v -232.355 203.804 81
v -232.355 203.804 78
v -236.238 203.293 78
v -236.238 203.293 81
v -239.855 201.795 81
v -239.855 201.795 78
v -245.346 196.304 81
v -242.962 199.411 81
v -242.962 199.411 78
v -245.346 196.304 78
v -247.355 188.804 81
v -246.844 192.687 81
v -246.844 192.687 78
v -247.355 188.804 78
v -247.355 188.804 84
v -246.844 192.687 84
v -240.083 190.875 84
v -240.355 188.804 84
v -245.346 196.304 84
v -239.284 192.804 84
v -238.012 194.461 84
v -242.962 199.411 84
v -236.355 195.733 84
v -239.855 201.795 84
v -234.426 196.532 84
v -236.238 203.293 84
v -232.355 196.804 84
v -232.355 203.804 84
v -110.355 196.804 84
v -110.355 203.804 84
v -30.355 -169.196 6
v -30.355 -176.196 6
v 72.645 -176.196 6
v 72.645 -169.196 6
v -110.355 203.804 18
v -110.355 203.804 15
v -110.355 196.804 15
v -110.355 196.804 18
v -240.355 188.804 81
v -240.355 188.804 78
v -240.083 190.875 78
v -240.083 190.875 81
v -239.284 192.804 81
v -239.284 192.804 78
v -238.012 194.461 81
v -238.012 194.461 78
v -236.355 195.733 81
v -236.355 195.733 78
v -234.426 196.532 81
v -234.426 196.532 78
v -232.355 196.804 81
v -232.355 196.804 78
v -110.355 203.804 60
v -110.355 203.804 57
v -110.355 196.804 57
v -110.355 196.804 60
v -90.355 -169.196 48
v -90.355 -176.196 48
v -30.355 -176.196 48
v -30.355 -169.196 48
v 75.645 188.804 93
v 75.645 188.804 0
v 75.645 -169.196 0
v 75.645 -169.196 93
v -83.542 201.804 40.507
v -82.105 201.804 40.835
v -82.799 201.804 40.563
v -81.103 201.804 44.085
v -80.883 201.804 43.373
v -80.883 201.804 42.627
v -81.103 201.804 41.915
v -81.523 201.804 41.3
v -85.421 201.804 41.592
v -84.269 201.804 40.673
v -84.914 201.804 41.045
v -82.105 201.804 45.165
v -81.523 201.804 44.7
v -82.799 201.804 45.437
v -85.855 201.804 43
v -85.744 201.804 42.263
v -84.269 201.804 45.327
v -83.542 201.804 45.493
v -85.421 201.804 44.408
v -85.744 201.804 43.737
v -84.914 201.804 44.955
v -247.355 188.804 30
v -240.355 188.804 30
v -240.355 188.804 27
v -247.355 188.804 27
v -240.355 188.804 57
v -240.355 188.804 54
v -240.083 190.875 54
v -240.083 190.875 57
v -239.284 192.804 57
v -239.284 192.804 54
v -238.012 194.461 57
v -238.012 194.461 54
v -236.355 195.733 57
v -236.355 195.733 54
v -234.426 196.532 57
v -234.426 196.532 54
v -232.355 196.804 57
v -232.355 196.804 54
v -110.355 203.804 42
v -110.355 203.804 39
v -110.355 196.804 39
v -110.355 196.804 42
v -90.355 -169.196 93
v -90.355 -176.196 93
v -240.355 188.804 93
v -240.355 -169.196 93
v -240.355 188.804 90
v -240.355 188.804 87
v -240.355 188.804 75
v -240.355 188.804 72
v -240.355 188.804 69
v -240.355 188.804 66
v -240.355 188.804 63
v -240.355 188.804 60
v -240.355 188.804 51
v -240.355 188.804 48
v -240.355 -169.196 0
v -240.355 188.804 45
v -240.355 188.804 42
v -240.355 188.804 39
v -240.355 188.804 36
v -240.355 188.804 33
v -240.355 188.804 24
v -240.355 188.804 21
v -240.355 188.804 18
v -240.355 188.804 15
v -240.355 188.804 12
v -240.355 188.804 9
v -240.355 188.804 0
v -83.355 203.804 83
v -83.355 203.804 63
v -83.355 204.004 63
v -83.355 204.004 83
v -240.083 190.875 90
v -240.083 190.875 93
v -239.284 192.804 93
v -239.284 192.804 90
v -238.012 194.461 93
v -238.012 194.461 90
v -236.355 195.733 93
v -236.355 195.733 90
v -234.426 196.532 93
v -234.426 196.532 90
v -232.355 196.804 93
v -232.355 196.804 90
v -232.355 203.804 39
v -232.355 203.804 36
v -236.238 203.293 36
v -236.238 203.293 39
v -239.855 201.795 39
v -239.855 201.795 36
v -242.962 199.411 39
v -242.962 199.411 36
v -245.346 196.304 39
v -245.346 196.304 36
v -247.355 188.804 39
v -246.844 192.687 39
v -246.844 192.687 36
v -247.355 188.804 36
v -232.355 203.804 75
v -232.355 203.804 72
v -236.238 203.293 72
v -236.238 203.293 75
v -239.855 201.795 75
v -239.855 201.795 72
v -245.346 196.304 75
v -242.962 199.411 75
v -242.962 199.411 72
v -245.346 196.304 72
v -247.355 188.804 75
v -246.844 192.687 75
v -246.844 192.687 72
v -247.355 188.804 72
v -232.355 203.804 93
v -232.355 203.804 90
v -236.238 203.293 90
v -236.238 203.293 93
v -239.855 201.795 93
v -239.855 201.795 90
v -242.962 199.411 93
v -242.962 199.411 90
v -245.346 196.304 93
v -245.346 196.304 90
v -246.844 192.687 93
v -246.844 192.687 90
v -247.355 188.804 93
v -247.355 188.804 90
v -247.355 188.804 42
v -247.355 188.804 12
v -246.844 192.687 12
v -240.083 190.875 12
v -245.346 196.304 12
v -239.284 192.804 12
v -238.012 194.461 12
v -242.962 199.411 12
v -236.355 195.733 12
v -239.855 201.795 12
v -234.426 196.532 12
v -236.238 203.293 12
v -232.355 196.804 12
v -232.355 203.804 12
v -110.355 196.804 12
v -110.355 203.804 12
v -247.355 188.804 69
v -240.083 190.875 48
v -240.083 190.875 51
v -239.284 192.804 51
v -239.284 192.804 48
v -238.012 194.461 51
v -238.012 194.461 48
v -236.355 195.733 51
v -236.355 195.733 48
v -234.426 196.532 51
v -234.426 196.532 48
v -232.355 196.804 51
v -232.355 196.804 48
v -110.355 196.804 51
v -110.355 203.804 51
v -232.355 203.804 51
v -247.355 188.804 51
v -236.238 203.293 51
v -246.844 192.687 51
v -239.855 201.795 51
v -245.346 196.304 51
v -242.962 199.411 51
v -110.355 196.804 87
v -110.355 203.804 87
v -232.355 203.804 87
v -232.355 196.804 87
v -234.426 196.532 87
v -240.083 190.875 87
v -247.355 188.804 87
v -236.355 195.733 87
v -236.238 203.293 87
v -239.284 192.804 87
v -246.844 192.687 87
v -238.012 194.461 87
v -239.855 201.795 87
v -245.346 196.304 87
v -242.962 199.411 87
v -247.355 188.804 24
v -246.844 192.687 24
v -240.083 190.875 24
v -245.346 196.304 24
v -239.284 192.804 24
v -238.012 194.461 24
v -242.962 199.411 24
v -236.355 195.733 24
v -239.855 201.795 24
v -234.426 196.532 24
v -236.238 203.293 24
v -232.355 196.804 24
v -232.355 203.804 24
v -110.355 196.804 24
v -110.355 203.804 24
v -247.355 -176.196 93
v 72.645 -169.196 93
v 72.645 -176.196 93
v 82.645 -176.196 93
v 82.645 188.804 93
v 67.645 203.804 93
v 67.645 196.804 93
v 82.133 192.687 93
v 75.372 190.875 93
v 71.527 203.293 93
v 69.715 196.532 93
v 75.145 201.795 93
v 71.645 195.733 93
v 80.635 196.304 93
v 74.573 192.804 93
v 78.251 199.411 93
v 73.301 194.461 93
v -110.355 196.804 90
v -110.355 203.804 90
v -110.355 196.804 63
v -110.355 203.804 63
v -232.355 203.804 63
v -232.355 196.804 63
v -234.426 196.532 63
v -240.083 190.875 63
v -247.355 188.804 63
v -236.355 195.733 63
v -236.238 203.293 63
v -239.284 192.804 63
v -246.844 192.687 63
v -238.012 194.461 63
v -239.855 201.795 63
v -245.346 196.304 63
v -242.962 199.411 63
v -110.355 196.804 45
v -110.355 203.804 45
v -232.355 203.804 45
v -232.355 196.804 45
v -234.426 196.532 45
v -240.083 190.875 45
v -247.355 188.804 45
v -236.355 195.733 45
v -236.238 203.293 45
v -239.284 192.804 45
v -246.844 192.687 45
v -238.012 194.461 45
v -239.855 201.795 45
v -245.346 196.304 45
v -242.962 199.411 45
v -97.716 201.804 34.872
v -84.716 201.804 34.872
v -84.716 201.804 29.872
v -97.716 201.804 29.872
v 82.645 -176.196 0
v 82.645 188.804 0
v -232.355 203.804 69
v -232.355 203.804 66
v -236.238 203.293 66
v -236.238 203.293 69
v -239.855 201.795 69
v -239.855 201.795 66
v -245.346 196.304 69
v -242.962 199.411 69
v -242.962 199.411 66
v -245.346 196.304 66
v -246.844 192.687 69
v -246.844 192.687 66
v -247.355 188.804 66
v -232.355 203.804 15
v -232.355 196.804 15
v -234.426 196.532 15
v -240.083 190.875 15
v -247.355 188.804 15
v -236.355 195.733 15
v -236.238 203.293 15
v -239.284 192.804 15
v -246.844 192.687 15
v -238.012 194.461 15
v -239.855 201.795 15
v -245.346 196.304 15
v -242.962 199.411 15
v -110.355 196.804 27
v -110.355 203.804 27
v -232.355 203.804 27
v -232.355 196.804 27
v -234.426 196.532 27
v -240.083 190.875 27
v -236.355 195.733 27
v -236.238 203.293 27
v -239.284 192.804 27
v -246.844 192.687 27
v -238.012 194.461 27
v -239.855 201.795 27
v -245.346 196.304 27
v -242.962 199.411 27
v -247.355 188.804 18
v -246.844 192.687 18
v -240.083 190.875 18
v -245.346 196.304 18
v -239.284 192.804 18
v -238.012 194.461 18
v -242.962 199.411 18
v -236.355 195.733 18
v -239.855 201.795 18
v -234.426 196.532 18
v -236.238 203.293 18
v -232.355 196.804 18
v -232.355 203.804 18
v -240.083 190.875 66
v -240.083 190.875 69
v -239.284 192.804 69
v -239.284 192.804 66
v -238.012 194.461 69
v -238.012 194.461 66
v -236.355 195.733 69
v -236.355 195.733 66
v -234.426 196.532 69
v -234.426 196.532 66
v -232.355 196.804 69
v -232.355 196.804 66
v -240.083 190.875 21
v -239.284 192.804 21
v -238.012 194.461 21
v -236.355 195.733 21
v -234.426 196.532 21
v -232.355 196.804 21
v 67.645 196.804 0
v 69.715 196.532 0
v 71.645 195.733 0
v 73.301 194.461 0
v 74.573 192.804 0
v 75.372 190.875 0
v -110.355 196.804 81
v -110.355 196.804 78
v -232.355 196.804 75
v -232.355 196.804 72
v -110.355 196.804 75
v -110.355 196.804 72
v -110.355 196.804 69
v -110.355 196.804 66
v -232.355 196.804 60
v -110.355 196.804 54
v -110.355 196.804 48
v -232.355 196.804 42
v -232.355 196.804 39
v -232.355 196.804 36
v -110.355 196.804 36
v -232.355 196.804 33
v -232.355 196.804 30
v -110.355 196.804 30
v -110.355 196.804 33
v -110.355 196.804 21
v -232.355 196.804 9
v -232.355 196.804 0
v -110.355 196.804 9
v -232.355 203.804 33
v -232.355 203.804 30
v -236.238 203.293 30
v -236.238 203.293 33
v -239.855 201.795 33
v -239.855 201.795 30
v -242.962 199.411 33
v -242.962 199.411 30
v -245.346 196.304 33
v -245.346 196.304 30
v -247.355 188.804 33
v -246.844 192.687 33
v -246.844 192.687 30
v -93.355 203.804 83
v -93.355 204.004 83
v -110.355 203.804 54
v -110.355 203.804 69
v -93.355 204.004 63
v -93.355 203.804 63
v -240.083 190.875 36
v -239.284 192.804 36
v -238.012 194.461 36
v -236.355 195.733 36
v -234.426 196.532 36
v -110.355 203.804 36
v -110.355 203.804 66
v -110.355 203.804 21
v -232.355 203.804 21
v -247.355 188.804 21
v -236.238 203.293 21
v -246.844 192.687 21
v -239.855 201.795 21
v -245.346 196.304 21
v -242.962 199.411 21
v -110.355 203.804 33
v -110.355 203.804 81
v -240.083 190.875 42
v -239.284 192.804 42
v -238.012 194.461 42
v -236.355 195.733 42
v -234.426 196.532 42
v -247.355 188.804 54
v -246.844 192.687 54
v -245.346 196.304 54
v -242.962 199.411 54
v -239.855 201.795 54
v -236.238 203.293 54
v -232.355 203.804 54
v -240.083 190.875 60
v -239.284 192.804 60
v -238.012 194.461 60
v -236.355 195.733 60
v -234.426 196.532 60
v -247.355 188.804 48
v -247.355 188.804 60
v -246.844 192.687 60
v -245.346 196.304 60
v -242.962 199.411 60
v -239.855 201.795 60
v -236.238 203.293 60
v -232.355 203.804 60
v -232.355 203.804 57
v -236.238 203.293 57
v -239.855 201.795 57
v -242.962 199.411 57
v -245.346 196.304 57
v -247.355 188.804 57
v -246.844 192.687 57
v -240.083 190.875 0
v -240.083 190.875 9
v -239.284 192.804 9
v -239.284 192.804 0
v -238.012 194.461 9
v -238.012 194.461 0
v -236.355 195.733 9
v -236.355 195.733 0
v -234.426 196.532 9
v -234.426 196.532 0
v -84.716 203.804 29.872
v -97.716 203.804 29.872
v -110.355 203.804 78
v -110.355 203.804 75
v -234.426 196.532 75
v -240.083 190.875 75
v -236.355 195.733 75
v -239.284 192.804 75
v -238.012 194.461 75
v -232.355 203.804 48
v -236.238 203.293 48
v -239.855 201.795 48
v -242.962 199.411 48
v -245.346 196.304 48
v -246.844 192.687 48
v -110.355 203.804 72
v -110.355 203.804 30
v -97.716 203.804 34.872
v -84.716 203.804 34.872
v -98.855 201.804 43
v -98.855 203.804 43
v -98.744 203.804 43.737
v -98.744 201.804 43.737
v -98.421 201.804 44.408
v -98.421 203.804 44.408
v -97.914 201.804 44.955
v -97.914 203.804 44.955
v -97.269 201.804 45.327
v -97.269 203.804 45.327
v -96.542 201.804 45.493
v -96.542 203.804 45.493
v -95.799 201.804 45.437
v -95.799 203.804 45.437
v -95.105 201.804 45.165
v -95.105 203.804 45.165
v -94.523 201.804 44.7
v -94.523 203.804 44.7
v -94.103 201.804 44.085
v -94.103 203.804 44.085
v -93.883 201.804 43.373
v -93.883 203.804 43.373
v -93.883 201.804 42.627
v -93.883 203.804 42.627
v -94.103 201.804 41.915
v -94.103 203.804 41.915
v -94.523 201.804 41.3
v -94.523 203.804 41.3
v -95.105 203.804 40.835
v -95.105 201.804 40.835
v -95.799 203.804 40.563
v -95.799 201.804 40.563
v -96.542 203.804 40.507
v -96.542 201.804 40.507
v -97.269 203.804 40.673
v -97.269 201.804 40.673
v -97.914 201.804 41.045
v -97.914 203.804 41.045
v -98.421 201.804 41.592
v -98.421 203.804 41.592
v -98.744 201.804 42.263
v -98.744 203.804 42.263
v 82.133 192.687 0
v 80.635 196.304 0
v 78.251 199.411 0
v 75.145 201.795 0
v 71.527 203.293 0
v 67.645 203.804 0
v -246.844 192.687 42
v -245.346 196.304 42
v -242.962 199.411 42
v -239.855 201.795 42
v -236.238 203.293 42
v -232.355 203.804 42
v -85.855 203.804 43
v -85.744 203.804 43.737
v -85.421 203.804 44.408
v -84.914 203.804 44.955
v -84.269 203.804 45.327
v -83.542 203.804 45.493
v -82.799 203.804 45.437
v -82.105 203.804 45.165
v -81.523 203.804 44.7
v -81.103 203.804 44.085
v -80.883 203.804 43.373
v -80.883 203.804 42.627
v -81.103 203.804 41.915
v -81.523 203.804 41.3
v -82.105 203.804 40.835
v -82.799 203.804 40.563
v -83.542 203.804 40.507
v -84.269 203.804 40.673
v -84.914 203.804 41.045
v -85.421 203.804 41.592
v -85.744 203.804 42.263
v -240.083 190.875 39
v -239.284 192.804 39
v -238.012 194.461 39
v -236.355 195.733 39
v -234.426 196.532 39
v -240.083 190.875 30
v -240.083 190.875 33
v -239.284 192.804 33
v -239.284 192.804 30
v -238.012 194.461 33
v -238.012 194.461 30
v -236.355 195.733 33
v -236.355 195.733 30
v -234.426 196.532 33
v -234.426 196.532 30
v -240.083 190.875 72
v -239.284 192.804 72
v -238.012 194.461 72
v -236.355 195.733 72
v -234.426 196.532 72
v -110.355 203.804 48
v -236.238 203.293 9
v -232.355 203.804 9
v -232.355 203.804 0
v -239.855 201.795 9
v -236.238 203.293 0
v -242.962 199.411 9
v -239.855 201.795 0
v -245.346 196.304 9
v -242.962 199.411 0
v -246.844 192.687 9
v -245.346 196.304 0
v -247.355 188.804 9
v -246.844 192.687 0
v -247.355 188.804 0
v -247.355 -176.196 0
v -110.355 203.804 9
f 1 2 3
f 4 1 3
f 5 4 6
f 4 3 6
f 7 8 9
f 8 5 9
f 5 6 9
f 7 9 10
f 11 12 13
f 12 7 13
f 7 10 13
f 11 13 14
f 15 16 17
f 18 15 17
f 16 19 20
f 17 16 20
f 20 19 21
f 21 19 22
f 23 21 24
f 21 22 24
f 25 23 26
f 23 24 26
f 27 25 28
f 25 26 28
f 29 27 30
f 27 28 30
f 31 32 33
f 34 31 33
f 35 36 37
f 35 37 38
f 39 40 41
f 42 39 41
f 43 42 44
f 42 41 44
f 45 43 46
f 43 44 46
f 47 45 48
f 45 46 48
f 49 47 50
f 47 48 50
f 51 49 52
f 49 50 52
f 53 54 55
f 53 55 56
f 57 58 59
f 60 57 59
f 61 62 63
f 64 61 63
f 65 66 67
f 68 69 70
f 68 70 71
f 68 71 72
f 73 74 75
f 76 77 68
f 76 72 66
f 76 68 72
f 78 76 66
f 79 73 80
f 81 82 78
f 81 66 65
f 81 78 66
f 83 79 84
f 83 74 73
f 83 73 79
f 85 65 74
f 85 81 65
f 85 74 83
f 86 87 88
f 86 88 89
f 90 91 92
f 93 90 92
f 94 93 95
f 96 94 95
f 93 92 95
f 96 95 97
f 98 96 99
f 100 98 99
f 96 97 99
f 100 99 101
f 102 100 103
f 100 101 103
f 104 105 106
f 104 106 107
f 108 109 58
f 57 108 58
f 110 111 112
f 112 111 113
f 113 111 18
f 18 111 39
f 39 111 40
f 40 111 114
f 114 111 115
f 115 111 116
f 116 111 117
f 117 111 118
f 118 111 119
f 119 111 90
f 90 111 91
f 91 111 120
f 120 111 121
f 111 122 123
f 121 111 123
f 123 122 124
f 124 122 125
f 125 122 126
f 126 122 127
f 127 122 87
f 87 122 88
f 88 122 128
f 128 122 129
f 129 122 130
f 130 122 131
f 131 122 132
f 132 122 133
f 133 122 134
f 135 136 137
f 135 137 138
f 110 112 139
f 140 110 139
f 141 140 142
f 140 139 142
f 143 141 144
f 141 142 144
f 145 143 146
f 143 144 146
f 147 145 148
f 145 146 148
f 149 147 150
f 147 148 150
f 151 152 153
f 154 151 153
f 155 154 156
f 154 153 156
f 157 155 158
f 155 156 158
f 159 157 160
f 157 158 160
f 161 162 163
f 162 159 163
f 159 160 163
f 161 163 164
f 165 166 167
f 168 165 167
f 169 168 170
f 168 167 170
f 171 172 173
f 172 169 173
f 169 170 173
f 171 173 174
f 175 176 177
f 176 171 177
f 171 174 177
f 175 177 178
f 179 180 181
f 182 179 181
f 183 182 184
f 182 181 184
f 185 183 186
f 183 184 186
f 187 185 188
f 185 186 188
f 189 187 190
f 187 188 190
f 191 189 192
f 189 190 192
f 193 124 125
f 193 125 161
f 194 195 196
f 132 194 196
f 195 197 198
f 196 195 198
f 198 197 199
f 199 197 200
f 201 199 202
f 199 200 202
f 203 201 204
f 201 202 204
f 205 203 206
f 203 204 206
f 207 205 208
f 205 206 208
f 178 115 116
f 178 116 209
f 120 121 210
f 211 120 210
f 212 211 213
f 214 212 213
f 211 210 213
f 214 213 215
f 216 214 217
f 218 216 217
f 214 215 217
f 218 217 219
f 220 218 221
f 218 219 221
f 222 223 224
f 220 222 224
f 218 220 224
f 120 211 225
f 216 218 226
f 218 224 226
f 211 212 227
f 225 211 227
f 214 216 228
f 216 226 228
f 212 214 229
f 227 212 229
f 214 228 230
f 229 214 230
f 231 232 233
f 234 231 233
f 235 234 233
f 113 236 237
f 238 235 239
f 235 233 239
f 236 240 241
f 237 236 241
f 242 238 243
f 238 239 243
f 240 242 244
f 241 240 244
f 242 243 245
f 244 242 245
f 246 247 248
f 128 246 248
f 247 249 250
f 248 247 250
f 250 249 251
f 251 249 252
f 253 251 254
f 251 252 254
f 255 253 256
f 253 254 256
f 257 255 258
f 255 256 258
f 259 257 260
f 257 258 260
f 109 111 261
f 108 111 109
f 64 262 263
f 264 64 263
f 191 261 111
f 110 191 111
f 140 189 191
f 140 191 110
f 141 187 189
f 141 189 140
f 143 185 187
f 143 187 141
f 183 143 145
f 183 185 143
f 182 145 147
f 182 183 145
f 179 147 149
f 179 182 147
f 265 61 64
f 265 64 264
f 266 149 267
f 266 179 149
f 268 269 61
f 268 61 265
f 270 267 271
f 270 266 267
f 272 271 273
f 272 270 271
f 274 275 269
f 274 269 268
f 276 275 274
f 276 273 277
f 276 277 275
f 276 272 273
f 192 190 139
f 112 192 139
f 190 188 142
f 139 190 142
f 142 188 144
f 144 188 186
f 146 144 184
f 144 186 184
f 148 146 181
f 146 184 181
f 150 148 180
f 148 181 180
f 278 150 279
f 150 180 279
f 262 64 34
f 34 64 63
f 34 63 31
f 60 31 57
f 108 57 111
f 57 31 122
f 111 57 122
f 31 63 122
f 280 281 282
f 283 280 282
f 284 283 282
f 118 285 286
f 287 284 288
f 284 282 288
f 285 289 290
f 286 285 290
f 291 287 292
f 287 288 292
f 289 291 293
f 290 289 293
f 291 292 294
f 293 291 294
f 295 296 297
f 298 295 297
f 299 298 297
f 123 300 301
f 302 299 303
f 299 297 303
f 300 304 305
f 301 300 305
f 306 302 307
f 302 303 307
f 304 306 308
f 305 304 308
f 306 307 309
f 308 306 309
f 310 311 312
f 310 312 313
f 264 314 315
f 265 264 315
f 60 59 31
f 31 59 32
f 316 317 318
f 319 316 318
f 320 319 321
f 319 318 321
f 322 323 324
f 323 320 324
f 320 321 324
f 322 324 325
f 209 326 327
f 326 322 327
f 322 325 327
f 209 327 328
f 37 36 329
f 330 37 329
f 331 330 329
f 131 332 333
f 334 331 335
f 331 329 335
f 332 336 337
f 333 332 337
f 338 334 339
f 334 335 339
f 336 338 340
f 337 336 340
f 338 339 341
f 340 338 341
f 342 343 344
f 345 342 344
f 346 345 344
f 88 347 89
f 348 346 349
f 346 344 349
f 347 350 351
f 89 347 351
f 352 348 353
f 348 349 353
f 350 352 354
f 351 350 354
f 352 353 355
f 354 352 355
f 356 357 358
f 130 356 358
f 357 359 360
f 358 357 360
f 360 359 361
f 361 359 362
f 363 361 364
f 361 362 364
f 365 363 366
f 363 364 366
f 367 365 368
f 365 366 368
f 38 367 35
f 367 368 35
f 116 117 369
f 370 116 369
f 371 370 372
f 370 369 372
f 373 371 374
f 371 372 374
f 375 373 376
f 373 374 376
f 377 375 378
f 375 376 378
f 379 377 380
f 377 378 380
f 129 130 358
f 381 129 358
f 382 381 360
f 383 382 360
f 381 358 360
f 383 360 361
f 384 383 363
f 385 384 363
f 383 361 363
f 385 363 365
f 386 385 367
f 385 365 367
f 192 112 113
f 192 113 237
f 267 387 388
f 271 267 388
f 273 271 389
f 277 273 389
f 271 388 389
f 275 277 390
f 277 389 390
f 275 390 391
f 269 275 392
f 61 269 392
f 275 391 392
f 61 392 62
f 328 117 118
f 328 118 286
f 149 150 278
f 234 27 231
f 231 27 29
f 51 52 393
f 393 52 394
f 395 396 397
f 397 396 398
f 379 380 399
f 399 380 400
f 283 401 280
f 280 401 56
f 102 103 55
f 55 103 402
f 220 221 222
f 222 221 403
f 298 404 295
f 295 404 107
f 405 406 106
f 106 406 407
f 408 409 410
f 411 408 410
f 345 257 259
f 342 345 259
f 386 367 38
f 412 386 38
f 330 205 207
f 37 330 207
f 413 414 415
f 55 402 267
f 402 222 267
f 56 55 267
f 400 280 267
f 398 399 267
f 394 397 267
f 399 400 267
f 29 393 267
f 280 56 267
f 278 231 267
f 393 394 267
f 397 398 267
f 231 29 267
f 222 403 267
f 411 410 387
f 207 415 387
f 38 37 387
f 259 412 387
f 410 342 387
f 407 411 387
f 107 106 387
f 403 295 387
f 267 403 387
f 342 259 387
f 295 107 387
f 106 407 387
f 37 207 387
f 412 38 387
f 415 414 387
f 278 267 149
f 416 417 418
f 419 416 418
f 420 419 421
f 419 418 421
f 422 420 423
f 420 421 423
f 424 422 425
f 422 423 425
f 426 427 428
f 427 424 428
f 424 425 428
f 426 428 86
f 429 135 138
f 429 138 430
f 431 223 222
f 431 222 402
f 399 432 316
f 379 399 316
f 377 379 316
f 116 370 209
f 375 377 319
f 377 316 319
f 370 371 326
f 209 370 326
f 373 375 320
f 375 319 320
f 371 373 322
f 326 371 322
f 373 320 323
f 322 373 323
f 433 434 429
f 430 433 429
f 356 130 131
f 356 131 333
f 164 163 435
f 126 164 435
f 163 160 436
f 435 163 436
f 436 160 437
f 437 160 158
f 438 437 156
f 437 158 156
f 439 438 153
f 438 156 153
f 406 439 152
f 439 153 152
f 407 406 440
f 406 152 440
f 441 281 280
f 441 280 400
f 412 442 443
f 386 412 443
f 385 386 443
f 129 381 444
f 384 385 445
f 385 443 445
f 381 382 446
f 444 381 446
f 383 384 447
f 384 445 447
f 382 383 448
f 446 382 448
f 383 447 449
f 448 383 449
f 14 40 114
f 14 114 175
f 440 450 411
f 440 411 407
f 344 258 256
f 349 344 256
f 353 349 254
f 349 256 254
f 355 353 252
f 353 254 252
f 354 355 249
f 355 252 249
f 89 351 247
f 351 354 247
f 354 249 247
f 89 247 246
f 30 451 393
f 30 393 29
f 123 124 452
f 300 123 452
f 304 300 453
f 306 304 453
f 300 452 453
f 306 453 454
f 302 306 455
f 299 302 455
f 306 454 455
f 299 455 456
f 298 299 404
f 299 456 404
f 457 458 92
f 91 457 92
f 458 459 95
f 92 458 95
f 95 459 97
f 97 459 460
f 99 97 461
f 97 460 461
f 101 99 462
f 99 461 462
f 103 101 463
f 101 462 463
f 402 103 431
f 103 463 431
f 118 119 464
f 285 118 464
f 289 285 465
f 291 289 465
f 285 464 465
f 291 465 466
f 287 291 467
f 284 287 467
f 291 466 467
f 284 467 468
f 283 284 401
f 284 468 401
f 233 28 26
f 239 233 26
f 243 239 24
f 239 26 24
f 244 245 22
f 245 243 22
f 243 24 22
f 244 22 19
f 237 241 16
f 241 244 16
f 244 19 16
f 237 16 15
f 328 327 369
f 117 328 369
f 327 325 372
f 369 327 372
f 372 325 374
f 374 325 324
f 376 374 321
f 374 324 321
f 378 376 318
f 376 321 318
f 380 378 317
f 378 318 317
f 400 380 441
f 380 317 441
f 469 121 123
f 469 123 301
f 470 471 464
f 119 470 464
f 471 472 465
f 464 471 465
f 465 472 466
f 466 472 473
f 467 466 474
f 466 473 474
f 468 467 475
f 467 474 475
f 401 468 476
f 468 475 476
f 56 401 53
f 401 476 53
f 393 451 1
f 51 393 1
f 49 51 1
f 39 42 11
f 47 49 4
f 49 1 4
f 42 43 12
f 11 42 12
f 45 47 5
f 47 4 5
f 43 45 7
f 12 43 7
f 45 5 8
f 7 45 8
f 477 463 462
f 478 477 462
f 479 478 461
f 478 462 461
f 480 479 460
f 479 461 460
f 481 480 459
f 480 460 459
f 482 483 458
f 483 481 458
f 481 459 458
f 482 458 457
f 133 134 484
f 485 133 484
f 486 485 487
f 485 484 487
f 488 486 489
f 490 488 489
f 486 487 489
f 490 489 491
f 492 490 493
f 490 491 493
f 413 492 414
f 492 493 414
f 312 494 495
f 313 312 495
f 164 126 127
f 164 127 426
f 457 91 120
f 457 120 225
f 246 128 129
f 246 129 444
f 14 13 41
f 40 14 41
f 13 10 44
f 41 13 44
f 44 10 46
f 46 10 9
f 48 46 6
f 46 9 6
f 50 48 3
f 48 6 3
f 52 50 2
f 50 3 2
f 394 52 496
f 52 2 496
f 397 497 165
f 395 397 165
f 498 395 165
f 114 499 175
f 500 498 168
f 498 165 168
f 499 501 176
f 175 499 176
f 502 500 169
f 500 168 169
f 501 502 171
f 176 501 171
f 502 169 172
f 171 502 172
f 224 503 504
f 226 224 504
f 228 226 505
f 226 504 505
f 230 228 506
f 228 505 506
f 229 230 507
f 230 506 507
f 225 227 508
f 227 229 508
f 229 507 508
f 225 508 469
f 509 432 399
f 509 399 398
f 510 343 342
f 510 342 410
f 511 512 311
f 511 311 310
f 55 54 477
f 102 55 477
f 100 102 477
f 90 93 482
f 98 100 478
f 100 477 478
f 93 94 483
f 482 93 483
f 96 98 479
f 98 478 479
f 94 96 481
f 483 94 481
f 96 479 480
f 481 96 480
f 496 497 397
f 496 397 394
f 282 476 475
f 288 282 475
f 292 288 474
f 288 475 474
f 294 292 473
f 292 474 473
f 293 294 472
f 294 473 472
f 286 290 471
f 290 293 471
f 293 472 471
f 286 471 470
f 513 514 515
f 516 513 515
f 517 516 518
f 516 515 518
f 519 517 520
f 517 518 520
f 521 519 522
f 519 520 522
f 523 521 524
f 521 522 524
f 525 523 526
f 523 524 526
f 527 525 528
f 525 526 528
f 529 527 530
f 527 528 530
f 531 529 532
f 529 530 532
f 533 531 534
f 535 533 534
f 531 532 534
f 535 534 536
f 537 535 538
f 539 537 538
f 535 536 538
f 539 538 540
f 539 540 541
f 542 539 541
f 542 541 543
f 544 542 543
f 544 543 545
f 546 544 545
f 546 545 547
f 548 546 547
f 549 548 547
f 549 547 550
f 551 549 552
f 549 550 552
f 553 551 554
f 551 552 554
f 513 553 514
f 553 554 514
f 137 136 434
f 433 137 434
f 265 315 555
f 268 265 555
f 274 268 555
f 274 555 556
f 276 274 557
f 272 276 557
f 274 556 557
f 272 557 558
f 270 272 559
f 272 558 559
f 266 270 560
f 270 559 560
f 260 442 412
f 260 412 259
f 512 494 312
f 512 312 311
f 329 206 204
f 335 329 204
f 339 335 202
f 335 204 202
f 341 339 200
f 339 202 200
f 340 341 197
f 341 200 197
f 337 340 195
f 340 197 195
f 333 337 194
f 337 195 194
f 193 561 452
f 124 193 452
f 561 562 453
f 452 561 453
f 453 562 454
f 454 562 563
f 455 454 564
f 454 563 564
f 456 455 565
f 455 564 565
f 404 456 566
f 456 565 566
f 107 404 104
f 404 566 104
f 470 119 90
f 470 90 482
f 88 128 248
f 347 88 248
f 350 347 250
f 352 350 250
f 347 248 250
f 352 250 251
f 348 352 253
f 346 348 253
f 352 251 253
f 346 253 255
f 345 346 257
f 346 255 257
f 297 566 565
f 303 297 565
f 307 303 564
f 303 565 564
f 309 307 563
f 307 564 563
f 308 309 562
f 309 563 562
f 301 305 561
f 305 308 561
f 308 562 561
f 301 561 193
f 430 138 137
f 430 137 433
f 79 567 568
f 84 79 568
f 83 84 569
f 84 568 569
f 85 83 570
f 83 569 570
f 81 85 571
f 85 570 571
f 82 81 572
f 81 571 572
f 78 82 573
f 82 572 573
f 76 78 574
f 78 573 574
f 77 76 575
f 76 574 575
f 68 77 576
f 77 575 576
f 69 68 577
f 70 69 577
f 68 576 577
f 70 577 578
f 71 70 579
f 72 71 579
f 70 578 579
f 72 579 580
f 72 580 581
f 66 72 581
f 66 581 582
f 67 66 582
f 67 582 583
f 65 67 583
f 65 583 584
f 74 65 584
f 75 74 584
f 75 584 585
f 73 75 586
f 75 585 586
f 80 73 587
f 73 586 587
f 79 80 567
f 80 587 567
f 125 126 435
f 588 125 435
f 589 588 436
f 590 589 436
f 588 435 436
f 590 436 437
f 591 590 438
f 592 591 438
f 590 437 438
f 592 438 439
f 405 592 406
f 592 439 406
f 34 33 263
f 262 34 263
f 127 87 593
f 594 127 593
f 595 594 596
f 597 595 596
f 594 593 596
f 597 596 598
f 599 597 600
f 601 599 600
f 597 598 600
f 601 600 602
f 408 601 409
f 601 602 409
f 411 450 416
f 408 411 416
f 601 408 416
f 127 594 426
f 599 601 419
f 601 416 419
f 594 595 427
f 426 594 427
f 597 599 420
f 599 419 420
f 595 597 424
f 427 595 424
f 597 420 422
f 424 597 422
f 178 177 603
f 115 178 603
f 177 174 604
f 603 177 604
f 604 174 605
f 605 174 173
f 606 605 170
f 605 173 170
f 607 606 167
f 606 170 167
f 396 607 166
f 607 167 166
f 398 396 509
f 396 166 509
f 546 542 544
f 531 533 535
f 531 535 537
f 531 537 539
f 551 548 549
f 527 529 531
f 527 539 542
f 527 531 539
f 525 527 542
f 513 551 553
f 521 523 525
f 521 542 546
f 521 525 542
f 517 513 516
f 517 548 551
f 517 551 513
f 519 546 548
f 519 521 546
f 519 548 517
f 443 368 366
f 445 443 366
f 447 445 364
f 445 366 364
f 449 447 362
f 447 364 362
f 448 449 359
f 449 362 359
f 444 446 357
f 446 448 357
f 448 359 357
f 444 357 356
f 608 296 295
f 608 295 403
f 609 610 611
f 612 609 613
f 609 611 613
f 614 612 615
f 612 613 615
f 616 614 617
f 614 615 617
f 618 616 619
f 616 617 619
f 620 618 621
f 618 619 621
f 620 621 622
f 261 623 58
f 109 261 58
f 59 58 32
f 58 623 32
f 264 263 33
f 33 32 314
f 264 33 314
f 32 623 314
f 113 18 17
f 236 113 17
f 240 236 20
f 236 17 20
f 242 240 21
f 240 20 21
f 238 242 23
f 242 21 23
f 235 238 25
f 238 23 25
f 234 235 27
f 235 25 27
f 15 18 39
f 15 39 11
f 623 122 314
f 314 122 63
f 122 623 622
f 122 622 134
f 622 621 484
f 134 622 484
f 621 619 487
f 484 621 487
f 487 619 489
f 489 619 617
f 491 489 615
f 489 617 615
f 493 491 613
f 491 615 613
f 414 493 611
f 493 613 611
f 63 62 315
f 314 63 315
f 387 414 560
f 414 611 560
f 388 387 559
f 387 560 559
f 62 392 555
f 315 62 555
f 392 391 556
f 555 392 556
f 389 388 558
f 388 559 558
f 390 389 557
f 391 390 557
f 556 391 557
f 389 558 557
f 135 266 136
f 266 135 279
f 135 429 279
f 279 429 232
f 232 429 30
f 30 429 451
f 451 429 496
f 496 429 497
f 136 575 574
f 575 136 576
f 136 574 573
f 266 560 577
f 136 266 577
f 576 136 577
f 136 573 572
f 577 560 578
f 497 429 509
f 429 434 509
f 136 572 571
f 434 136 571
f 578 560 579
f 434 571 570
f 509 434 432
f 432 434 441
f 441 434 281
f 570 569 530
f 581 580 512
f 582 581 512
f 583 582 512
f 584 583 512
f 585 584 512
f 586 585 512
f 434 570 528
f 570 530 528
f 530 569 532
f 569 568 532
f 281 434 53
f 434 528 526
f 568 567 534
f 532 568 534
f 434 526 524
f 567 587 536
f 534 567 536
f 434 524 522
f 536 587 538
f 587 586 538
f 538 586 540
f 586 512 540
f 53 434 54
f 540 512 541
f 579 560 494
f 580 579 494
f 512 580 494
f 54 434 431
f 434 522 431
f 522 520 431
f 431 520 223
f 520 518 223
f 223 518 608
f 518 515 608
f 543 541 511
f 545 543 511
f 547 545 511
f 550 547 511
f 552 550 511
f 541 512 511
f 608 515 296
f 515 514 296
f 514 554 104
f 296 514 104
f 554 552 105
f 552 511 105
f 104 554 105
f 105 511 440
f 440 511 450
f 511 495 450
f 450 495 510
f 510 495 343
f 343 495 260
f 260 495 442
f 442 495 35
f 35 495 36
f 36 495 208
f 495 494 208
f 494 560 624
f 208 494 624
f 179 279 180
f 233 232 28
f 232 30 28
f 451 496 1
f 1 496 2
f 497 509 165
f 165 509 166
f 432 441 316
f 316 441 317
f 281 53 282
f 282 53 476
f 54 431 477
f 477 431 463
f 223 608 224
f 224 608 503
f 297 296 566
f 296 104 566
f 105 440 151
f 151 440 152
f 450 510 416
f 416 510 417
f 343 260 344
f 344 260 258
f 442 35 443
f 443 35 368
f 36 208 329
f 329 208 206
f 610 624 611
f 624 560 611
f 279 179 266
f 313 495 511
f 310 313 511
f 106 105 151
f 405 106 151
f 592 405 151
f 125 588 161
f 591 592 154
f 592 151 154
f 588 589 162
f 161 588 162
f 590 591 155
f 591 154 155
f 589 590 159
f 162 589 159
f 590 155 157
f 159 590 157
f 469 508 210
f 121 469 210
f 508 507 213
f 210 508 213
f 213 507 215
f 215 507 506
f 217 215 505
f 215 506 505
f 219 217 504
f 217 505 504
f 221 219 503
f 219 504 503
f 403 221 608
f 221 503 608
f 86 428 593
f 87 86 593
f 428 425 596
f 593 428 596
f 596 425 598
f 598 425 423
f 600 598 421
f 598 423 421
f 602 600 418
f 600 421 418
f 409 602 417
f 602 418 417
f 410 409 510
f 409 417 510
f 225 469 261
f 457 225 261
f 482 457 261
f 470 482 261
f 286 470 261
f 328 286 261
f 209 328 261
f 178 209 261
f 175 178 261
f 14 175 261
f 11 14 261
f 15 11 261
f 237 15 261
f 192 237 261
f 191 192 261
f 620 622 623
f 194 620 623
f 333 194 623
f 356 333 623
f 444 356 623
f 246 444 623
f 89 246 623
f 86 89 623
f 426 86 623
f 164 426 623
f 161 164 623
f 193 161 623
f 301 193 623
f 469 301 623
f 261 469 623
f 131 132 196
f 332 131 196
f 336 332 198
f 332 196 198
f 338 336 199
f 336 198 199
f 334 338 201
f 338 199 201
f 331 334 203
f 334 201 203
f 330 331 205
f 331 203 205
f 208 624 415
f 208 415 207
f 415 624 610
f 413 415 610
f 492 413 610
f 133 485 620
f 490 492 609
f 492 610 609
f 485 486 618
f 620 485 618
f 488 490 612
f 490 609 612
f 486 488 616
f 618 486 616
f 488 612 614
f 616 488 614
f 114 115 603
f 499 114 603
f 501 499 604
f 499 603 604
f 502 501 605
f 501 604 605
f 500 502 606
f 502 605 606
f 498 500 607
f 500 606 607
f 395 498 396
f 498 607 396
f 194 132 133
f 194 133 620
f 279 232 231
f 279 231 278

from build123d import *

# Parameters (mm, degrees)
F1_DEPTH  = 93
F3_DEPTH  = 25
F4_W      = 122
F4_H      = 3
F4_W_2    = 15
F5_DEPTH  = 15
F6_DEPTH  = 15
F7_DEPTH  = 15
F8_DEPTH  = 15
F9_DEPTH  = 15
F10_DEPTH = 15
F11_DEPTH = 15
F12_DEPTH = 15
F13_DEPTH = 15
F14_DEPTH = 15
F15_DEPTH = 15
F16_DEPTH = 15
F17_DEPTH = 15
F18_DEPTH = 15
F19_W     = 10
F19_H     = 20
F20_DEPTH = 0.2
F21_R     = 2.5
F22_DEPTH = 2
F23_DEPTH = 2
F24_W     = 13
F24_H     = 5
F25_DEPTH = 2


with BuildPart() as f1:
    # F0 (on Top) → F1 (new body)
    with BuildSketch(Plane.XY):
        with BuildLine():
            Line((67.644592, 203.804426), (-232.355408, 203.804426))
            ThreePointArc((-232.355408, 203.804426), (-242.96201, 199.411027), (-247.355408, 188.804426))
            Line((-247.355408, 188.804426), (-247.355408, -176.195574))
            Line((-247.355408, -176.195574), (82.644592, -176.195574))
            Line((82.644592, -176.195574), (82.644592, 188.804426))
            ThreePointArc((82.644592, 188.804426), (78.251193, 199.411027), (67.644592, 203.804426))
        make_face()
        with BuildLine():
            ThreePointArc((-240.355408, 188.804426), (-238.012263, 194.46128), (-232.355408, 196.804426))
            Line((-232.355408, 196.804426), (67.644592, 196.804426))
            ThreePointArc((67.644592, 196.804426), (73.301446, 194.46128), (75.644592, 188.804426))
            Line((75.644592, 188.804426), (75.644592, -169.195574))
            Line((75.644592, -169.195574), (-240.355408, -169.195574))
            Line((-240.355408, -169.195574), (-240.355408, 188.804426))
        make_face(mode=Mode.SUBTRACT)
    extrude(amount=F1_DEPTH)

    # F2 (on face) → F3 (cut)
    with BuildSketch(Plane.XZ.offset(176.195574)):
        Polygon((-30.355408, 6), (72.644592, 6), (72.644592, 100.520082), (-30.355408, 100.520082), (-30.355408, 48), align=None)
        Polygon((-90.355408, 48), (-30.355408, 48), (-30.355408, 100.520082), (-90.355408, 99.808939), align=None)
    extrude(amount=-F3_DEPTH, mode=Mode.SUBTRACT)

    # F4 (on face) → F5 (cut)
    with BuildSketch(Plane(origin=(0, 203.804426, 0), x_dir=(-1, 0, 0), z_dir=(0, 1, 0))):
        with Locations((171.355408, 88.5)):
            Rectangle(F4_W, F4_H)
        with Locations((239.855408, 88.5)):
            Rectangle(F4_W_2, F4_H)
    extrude(amount=-F5_DEPTH, mode=Mode.SUBTRACT)

    # F4 (on face) → F6 (cut)
    with BuildSketch(Plane(origin=(0, 203.804426, 0), x_dir=(-1, 0, 0), z_dir=(0, 1, 0))):
        with Locations((171.355408, 82.5)):
            Rectangle(F4_W, F4_H)
        with Locations((239.855408, 82.5)):
            Rectangle(F4_W_2, F4_H)
    extrude(amount=-F6_DEPTH, mode=Mode.SUBTRACT)

    # F4 (on face) → F7 (cut)
    with BuildSketch(Plane(origin=(0, 203.804426, 0), x_dir=(-1, 0, 0), z_dir=(0, 1, 0))):
        with Locations((171.355408, 76.5)):
            Rectangle(F4_W, F4_H)
        with Locations((239.855408, 76.5)):
            Rectangle(F4_W_2, F4_H)
    extrude(amount=-F7_DEPTH, mode=Mode.SUBTRACT)

    # F4 (on face) → F8 (cut)
    with BuildSketch(Plane(origin=(0, 203.804426, 0), x_dir=(-1, 0, 0), z_dir=(0, 1, 0))):
        with Locations((171.355408, 70.5)):
            Rectangle(F4_W, F4_H)
        with Locations((239.855408, 70.5)):
            Rectangle(F4_W_2, F4_H)
    extrude(amount=-F8_DEPTH, mode=Mode.SUBTRACT)

    # F4 (on face) → F9 (cut)
    with BuildSketch(Plane(origin=(0, 203.804426, 0), x_dir=(-1, 0, 0), z_dir=(0, 1, 0))):
        with Locations((171.355408, 64.5)):
            Rectangle(F4_W, F4_H)
        with Locations((239.855408, 64.5)):
            Rectangle(F4_W_2, F4_H)
    extrude(amount=-F9_DEPTH, mode=Mode.SUBTRACT)

    # F4 (on face) → F10 (cut)
    with BuildSketch(Plane(origin=(0, 203.804426, 0), x_dir=(-1, 0, 0), z_dir=(0, 1, 0))):
        with Locations((171.355408, 58.5)):
            Rectangle(F4_W, F4_H)
        with Locations((239.855408, 58.5)):
            Rectangle(F4_W_2, F4_H)
    extrude(amount=-F10_DEPTH, mode=Mode.SUBTRACT)

    # F4 (on face) → F11 (cut)
    with BuildSketch(Plane(origin=(0, 203.804426, 0), x_dir=(-1, 0, 0), z_dir=(0, 1, 0))):
        with Locations((171.355408, 52.5)):
            Rectangle(F4_W, F4_H)
        with Locations((239.855408, 52.5)):
            Rectangle(F4_W_2, F4_H)
    extrude(amount=-F11_DEPTH, mode=Mode.SUBTRACT)

    # F4 (on face) → F12 (cut)
    with BuildSketch(Plane(origin=(0, 203.804426, 0), x_dir=(-1, 0, 0), z_dir=(0, 1, 0))):
        with Locations((171.355408, 46.5)):
            Rectangle(F4_W, F4_H)
        with Locations((239.855408, 46.5)):
            Rectangle(F4_W_2, F4_H)
    extrude(amount=-F12_DEPTH, mode=Mode.SUBTRACT)

    # F4 (on face) → F13 (cut)
    with BuildSketch(Plane(origin=(0, 203.804426, 0), x_dir=(-1, 0, 0), z_dir=(0, 1, 0))):
        with Locations((171.355408, 40.5)):
            Rectangle(F4_W, F4_H)
        with Locations((239.855408, 40.5)):
            Rectangle(F4_W_2, F4_H)
    extrude(amount=-F13_DEPTH, mode=Mode.SUBTRACT)

    # F4 (on face) → F14 (cut)
    with BuildSketch(Plane(origin=(0, 203.804426, 0), x_dir=(-1, 0, 0), z_dir=(0, 1, 0))):
        with Locations((171.355408, 34.5)):
            Rectangle(F4_W, F4_H)
        with Locations((239.855408, 34.5)):
            Rectangle(F4_W_2, F4_H)
    extrude(amount=-F14_DEPTH, mode=Mode.SUBTRACT)

    # F4 (on face) → F15 (cut)
    with BuildSketch(Plane(origin=(0, 203.804426, 0), x_dir=(-1, 0, 0), z_dir=(0, 1, 0))):
        with Locations((171.355408, 28.5)):
            Rectangle(F4_W, F4_H)
        with Locations((239.855408, 28.5)):
            Rectangle(F4_W_2, F4_H)
    extrude(amount=-F15_DEPTH, mode=Mode.SUBTRACT)

    # F4 (on face) → F16 (cut)
    with BuildSketch(Plane(origin=(0, 203.804426, 0), x_dir=(-1, 0, 0), z_dir=(0, 1, 0))):
        with Locations((171.355408, 22.5)):
            Rectangle(F4_W, F4_H)
        with Locations((239.855408, 22.5)):
            Rectangle(F4_W_2, F4_H)
    extrude(amount=-F16_DEPTH, mode=Mode.SUBTRACT)

    # F4 (on face) → F17 (cut)
    with BuildSketch(Plane(origin=(0, 203.804426, 0), x_dir=(-1, 0, 0), z_dir=(0, 1, 0))):
        with Locations((171.355408, 16.5)):
            Rectangle(F4_W, F4_H)
        with Locations((239.855408, 16.5)):
            Rectangle(F4_W_2, F4_H)
    extrude(amount=-F17_DEPTH, mode=Mode.SUBTRACT)

    # F4 (on face) → F18 (cut)
    with BuildSketch(Plane(origin=(0, 203.804426, 0), x_dir=(-1, 0, 0), z_dir=(0, 1, 0))):
        with Locations((171.355408, 10.5)):
            Rectangle(F4_W, F4_H)
        with Locations((239.855408, 10.5)):
            Rectangle(F4_W_2, F4_H)
    extrude(amount=-F18_DEPTH, mode=Mode.SUBTRACT)

    # F19 (on face) → F20 (join)
    with BuildSketch(Plane(origin=(0, 203.804426, 0), x_dir=(-1, 0, 0), z_dir=(0, 1, 0))):
        with Locations((88.355408, 73)):
            Rectangle(F19_W, F19_H)
    extrude(amount=F20_DEPTH)

    # F21 (on face) → F22 (cut)
    with BuildSketch(Plane(origin=(0, 203.804426, 0), x_dir=(-1, 0, 0), z_dir=(0, 1, 0))):
        with Locations((83.355408, 43)):
            Circle(F21_R)
    extrude(amount=-F22_DEPTH, mode=Mode.SUBTRACT)

    # F21 (on face) → F23 (cut)
    with BuildSketch(Plane(origin=(0, 203.804426, 0), x_dir=(-1, 0, 0), z_dir=(0, 1, 0))):
        with Locations((96.355408, 43)):
            Circle(F21_R)
    extrude(amount=-F23_DEPTH, mode=Mode.SUBTRACT)

    # F24 (on face) → F25 (cut)
    with BuildSketch(Plane(origin=(0, 203.804426, 0), x_dir=(-1, 0, 0), z_dir=(0, 1, 0))):
        with Locations((91.216292, 32.372116)):
            Rectangle(F24_W, F24_H)
    extrude(amount=-F25_DEPTH, mode=Mode.SUBTRACT)


solid = f1.part
